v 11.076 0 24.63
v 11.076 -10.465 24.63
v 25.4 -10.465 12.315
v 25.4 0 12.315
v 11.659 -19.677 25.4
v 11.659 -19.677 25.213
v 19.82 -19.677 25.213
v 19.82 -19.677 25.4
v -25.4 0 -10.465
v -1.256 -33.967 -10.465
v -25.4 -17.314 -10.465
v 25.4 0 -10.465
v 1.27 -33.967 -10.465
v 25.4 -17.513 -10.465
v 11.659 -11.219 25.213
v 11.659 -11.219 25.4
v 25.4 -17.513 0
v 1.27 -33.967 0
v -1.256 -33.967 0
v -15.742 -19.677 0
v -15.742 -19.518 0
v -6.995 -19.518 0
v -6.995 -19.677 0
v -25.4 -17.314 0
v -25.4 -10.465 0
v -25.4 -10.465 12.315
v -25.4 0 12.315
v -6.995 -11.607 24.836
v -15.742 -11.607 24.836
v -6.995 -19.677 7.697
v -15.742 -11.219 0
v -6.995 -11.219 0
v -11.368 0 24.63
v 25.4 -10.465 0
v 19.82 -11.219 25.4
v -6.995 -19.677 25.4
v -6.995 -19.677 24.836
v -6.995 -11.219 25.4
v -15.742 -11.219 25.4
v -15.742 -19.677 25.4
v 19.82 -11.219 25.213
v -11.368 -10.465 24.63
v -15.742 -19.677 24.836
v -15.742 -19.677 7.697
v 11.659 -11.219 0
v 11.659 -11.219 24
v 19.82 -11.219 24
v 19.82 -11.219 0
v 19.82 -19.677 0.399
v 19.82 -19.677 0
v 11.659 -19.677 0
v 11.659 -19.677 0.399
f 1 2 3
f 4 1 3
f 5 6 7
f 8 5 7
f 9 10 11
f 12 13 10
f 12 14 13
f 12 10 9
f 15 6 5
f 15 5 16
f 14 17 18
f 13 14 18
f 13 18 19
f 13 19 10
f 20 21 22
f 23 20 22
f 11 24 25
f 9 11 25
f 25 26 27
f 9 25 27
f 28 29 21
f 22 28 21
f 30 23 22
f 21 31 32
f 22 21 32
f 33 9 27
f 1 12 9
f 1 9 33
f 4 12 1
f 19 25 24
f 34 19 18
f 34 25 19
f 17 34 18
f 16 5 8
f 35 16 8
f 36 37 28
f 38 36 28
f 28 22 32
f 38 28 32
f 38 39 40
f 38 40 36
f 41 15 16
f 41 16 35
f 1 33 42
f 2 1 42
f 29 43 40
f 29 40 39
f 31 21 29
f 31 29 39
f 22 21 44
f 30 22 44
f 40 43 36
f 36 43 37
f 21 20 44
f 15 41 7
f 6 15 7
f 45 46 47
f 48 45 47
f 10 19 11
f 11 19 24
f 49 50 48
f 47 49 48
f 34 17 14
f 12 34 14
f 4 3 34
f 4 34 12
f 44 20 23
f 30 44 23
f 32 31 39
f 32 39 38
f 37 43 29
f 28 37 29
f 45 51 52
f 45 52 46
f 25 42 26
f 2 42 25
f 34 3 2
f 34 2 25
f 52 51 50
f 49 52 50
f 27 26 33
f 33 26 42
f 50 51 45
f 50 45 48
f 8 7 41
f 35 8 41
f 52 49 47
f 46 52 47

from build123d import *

# Parameters (mm, degrees)
F1_DEPTH      = 25.4
F1_DEPTH_BACK = 25.4
F3_DEPTH      = 25.4
F5_DEPTH      = 25.4
F6_W          = 8.746969
F6_H          = 8.4582
F6_W_2        = 8.16131
F7_DEPTH      = 25.4
F9_DEPTH      = 25.4
F11_DEPTH     = 25.4


with BuildPart() as f1:
    # F0 (on Right) → F1 (new body, two sides)
    with BuildSketch(Plane.YZ) as f1_sk:
        Polygon((-10.4648, 0), (-33.967059, 0), (-33.967059, -10.4648), (0, -10.4648), (0, 24.629673), (-10.4648, 24.629673), align=None)
    extrude(amount=F1_DEPTH)
    extrude(f1_sk.sketch, amount=-F1_DEPTH_BACK)

    # F2 (on Top) → F3 (cut)
    with BuildSketch(Plane.XY):
        Polygon((25.649834, -17.342787), (0, -34.833413), (25.649834, -34.833413), align=None)
        Polygon((0, -34.833413), (-27.24384, -16.0423), (-27.24384, -34.833413), align=None)
    extrude(amount=-F3_DEPTH, mode=Mode.SUBTRACT)

    # F4 (on face) → F5 (cut)
    with BuildSketch(Plane.XZ.offset(10.4648)):
        Polygon((-25.4, 24.629673), (-25.4, 12.314836), (-11.367541, 24.629673), align=None)
        Polygon((11.076065, 24.629673), (25.4, 12.314836), (25.4, 24.629673), align=None)
    extrude(amount=-F5_DEPTH, mode=Mode.SUBTRACT)


with BuildPart() as f7:
    # F6 (on Top) → F7 (new body)
    with BuildSketch(Plane.XY):
        with Locations((-11.368895, -15.448198)):
            Rectangle(F6_W, F6_H)
        with Locations((15.739672, -15.448198)):
            Rectangle(F6_W_2, F6_H)
    extrude(amount=F7_DEPTH)

    # F8 (on face) → F9 (cut)
    with BuildSketch(Plane.YZ.offset(19.820327)):
        Polygon((-19.820329, 25.212623), (-19.820329, 0), (-10.784591, 25.212623), align=None)
    extrude(amount=-F9_DEPTH, mode=Mode.SUBTRACT)

    # F10 (on face) → F11 (cut)
    with BuildSketch(Plane(origin=(-15.74238, 0, 0), x_dir=(0, -1, 0), z_dir=(-1, 0, 0))):
        Polygon((19.677298, 7.696618), (19.677298, 24.836298), (11.607133, 24.836298), (19.517587, 0), align=None)
    extrude(amount=-F11_DEPTH, mode=Mode.SUBTRACT)


solid = Compound([f1.part, f7.part])
